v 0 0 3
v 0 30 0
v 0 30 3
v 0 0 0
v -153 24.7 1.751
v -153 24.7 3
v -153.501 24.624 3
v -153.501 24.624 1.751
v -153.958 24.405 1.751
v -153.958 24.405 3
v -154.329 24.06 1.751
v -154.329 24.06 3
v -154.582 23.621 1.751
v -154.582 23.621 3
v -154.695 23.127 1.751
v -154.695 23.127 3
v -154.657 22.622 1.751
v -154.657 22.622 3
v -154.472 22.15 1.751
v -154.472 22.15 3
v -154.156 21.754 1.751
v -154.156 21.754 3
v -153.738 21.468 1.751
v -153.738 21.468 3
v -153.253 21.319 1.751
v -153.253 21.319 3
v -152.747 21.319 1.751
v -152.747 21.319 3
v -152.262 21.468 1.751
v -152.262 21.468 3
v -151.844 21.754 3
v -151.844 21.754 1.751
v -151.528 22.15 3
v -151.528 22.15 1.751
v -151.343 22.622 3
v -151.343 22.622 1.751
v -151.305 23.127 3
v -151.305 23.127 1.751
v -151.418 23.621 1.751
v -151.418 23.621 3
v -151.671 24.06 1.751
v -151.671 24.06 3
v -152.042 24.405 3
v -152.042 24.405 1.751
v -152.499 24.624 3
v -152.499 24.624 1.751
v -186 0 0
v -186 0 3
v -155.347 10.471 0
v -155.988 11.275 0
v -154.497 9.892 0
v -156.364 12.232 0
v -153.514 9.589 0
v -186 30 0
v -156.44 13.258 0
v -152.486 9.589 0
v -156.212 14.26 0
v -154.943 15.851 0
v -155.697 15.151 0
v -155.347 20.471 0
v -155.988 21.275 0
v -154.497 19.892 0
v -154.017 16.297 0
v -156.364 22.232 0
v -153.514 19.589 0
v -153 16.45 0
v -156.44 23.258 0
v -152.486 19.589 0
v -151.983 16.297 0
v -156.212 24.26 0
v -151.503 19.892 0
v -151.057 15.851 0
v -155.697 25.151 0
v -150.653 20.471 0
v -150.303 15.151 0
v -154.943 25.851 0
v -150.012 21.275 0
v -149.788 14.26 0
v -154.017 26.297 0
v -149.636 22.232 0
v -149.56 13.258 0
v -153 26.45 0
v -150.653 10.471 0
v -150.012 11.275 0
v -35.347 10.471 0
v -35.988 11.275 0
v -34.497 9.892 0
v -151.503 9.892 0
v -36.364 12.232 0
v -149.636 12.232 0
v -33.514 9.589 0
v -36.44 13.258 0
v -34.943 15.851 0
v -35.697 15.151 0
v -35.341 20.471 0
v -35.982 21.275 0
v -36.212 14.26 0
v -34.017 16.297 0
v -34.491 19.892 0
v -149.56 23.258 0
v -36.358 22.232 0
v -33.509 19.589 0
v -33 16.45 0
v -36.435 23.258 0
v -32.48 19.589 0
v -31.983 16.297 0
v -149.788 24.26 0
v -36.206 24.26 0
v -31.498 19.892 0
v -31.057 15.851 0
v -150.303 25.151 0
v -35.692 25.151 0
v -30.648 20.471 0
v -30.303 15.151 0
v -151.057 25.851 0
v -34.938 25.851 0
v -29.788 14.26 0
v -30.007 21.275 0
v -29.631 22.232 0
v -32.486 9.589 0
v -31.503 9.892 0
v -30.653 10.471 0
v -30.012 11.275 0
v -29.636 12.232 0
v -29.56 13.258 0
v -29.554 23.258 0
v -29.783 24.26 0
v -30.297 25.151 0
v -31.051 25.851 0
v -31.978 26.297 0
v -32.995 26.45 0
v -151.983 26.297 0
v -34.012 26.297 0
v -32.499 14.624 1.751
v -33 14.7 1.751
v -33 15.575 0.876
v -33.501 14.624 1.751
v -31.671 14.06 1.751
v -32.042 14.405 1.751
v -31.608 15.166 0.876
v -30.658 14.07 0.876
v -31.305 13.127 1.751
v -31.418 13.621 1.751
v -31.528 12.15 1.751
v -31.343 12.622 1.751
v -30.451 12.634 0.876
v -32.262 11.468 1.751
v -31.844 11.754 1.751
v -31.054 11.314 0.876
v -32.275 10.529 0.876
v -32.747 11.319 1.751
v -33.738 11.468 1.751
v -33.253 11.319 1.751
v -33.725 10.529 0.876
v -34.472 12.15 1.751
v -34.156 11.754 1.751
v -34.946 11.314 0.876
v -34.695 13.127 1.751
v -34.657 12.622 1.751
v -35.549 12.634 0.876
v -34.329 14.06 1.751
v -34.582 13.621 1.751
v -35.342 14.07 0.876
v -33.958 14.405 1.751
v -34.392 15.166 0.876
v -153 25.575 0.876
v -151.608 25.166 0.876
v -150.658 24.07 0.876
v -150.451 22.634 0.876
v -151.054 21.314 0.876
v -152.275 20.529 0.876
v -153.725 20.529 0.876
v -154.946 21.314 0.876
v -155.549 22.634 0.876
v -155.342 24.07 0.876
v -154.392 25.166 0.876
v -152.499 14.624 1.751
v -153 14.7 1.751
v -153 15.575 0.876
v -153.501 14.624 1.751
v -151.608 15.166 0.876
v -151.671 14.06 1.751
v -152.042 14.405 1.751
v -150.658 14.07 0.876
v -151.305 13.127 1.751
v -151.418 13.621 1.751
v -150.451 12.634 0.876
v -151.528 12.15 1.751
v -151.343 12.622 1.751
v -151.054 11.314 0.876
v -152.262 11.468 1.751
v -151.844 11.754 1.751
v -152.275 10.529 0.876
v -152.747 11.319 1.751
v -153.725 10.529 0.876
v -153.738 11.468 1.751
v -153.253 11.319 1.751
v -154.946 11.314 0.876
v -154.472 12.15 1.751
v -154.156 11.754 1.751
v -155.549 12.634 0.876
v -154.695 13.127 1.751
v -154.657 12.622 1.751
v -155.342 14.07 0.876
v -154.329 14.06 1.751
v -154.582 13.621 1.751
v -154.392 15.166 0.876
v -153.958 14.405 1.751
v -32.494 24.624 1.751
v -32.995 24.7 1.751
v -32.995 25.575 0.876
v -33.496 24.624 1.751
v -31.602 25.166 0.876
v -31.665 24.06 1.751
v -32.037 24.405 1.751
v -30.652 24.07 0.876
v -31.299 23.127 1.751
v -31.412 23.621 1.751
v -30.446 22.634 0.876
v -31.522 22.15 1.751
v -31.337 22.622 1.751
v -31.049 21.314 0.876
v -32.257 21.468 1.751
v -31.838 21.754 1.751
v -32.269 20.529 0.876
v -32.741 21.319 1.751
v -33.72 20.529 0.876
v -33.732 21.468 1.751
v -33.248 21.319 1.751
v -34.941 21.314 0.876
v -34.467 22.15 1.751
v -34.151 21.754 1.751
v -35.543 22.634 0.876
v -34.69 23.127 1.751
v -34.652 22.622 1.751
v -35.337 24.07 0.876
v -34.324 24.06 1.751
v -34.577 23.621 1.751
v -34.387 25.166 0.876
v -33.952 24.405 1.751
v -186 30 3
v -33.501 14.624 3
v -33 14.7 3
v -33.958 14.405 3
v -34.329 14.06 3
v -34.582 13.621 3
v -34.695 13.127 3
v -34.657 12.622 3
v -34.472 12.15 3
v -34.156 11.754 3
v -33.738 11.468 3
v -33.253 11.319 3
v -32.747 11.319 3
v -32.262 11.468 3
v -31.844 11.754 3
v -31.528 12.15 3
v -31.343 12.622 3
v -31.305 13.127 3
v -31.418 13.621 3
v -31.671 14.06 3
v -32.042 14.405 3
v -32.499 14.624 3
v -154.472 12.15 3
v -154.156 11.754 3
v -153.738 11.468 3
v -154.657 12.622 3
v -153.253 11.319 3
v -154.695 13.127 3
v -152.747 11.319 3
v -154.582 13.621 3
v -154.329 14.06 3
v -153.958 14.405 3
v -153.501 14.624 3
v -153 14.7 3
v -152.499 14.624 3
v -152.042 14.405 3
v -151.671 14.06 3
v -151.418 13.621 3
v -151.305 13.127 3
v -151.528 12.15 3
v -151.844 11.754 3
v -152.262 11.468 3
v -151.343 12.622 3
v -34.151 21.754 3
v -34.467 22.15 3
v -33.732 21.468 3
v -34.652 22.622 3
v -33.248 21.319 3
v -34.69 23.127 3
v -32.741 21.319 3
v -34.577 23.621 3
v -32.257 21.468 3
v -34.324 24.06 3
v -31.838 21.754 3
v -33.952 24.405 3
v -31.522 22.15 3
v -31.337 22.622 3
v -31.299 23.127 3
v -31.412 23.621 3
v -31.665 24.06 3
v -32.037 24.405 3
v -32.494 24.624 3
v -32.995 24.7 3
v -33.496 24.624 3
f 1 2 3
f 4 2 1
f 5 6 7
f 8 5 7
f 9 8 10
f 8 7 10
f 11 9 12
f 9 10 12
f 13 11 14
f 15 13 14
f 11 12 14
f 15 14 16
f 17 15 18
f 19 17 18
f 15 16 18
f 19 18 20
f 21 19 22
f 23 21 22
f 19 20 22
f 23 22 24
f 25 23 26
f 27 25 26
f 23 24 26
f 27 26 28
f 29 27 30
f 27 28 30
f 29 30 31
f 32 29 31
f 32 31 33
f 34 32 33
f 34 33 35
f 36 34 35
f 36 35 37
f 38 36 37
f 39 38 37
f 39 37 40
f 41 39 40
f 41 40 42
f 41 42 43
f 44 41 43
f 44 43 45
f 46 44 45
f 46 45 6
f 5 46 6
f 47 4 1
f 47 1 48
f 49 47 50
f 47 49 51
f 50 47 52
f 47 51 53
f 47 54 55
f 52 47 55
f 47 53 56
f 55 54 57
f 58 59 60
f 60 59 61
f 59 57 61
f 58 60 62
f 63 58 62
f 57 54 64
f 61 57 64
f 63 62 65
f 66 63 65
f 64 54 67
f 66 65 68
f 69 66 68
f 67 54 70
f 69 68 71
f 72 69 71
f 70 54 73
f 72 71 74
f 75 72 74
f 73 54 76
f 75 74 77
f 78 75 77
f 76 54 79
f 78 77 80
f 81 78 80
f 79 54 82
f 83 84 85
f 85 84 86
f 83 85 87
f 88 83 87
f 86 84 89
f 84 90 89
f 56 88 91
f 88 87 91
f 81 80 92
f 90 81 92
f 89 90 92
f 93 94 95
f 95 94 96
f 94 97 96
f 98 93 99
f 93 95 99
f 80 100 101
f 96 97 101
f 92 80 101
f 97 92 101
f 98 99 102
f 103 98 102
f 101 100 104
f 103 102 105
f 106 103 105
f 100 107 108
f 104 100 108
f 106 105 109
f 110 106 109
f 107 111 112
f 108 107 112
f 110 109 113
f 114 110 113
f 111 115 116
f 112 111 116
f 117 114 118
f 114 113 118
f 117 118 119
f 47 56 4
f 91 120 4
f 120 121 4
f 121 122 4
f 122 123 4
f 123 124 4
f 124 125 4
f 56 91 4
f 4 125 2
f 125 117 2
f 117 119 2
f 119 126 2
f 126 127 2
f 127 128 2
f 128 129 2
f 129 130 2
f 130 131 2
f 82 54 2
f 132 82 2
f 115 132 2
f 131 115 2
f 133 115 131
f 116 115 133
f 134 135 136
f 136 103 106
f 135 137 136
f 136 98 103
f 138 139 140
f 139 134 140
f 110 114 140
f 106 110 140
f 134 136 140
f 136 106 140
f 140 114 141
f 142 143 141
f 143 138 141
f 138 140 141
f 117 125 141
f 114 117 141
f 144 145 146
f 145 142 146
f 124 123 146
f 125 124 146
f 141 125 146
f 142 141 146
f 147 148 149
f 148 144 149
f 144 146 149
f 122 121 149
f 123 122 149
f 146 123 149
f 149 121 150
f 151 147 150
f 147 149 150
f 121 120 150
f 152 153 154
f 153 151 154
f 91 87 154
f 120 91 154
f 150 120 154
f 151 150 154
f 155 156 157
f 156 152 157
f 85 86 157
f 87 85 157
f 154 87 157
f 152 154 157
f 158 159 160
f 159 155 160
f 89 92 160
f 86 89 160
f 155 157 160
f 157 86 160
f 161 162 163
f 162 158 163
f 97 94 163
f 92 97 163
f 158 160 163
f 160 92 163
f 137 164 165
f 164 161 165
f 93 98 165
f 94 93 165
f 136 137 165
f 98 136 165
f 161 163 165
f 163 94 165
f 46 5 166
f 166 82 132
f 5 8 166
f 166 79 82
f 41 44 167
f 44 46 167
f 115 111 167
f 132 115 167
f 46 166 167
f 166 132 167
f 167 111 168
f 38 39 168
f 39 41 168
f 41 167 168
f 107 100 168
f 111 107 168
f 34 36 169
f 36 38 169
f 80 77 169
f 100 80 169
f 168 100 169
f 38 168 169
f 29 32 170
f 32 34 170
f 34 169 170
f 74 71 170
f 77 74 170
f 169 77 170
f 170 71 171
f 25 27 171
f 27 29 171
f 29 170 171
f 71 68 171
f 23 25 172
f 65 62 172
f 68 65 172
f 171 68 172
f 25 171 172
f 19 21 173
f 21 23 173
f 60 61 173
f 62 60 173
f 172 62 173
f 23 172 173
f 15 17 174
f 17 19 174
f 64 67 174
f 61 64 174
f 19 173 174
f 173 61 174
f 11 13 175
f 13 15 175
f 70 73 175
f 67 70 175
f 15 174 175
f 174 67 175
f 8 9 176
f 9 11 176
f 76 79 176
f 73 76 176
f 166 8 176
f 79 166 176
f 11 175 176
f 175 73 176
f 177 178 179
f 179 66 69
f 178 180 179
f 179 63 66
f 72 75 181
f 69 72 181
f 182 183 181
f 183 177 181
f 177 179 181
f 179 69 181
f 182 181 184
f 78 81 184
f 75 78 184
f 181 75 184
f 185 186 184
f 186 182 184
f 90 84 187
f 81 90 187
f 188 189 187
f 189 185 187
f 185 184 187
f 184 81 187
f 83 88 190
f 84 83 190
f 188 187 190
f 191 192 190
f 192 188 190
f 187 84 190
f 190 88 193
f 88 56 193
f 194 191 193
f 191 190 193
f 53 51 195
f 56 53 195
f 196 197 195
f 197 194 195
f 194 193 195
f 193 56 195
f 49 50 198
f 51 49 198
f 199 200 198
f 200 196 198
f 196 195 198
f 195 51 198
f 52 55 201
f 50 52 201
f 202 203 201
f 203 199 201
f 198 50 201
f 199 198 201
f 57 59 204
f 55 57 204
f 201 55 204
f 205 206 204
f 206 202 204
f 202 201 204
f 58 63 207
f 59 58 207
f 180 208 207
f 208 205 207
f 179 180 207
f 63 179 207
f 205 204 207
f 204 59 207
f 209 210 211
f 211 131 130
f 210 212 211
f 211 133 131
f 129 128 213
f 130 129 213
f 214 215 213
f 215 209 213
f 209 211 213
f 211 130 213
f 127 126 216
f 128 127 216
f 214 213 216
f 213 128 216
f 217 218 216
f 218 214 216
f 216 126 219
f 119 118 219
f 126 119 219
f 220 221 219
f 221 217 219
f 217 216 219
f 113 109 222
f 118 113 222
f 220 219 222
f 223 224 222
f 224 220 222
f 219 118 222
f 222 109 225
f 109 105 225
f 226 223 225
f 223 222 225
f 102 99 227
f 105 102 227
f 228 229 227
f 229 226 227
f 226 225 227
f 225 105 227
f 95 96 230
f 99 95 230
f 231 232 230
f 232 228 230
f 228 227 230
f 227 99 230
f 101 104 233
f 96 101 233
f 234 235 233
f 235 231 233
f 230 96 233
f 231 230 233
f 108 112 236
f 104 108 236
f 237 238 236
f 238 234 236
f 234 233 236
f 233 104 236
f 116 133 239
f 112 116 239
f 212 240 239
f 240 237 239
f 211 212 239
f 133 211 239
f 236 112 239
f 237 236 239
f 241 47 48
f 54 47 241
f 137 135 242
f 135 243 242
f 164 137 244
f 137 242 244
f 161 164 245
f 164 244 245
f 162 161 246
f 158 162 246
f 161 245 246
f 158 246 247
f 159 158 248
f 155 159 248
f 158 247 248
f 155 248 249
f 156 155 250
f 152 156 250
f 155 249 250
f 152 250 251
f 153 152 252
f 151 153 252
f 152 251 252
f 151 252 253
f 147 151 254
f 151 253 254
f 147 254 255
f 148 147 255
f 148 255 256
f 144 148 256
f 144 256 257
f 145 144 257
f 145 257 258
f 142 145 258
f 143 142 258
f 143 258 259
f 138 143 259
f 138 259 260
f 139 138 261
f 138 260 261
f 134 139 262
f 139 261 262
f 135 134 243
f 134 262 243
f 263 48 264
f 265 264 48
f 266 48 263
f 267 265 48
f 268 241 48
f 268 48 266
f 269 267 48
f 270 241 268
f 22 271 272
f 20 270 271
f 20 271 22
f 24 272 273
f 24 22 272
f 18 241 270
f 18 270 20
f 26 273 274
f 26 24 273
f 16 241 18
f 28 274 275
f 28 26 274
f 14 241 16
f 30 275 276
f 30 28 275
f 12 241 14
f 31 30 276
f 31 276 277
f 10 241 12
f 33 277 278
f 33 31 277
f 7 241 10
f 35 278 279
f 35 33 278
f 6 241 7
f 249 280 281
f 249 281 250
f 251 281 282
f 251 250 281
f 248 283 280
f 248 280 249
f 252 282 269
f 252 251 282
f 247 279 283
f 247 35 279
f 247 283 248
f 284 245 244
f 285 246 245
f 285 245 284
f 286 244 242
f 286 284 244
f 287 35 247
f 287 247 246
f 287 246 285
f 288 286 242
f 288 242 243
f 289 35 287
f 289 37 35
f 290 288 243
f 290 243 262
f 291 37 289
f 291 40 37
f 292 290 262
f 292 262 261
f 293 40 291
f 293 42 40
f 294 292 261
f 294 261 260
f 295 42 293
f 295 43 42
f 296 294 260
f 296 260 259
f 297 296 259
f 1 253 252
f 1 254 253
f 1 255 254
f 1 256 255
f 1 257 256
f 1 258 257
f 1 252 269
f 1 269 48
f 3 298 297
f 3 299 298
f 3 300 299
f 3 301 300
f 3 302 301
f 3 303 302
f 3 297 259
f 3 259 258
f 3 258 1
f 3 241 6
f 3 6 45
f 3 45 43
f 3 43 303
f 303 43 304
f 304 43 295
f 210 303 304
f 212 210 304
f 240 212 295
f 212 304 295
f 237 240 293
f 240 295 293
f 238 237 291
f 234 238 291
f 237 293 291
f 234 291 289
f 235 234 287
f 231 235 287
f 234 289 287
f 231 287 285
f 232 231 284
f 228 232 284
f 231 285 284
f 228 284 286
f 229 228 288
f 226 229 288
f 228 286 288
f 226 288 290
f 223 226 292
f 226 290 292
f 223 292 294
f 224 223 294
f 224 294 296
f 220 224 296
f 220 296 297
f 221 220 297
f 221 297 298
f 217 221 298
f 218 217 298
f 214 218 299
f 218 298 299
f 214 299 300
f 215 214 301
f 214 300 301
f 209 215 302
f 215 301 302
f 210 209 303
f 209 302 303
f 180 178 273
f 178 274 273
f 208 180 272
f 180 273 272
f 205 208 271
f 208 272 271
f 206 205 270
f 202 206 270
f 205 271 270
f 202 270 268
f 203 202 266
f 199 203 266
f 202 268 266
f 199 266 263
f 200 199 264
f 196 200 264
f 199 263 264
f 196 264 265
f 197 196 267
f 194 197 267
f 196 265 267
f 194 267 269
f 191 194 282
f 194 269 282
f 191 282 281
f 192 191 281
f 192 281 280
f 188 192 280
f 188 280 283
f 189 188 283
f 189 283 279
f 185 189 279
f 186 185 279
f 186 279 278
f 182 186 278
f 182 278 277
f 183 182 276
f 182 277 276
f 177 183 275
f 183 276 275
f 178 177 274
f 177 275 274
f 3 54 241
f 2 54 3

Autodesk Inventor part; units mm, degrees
ref_plane "YZ Plane" through (0, 0, 0) normal (1, 0, 0) x (0, 1, 0)
ref_plane "XZ Plane" through (0, 0, 0) normal (0, 1, 0) x (-1, 0, 0)
ref_plane "XY Plane" through (0, 0, 0) normal (0, 0, 1) x (1, 0, 0)
sketch "Sketch1" plane through (0, 0, 0) normal (0, 0, 1) x (1, 0, 0)
  line L0 (0, 0) -> (-186, 0)
  line L1 (-186, 0) -> (-186, 30)
  line L2 (-186, 30) -> (0, 30)
  line L3 (0, 30) -> (0, 0)
  dimension "d0" = 186
  dimension "d1" = 30
extrude "Extrusion1" add sketch "Sketch1" along normal blind 3
sketch "Sketch2" plane through (0, 0, 0) normal (0, 0, -1) x (-1, 0, 0)
  line L0 (0, 0) -> (186, 0) projected
  line L1 (0, 0) -> (33, 0)
  line L2 (33, 0) -> (33, 13)
  line L3 (33, 13) -> (0, 13)
  line L4 (0, 13) -> (0, 0)
  line L5 (0, 30) -> (186, 30) projected
  line L6 (0, 30) -> (32.9946, 30)
  line L7 (32.9946, 30) -> (32.9946, 23)
  line L8 (32.9946, 23) -> (0, 23)
  line L9 (0, 23) -> (0, 30)
  line L10 (186, 0) -> (153, 0)
  line L11 (153, 0) -> (153, 13)
  line L12 (153, 13) -> (186, 13)
  line L13 (186, 13) -> (186, 0)
  line L14 (186, 30) -> (153, 30)
  line L15 (153, 30) -> (153, 23)
  line L16 (153, 23) -> (186, 23)
  line L17 (186, 23) -> (186, 30)
  dimension "d16" = 33
  dimension "d17" = 13
  dimension "d18" = 32.9946
  dimension "d19" = 7
  dimension "d20" = 33
hole "Hole1" at (-32.9946, 23, 0) at (-33, 13, 0) at (-153, 23, 0) at (-153, 13, 0) direction (0, 0, 1) diameter 3.4 end through all countersink diameter 6.9 countersink angle 89.954 clearance for "Countersunk Flat Head Screw ISO 2009/7046" size "M3" standard "ISO"
properties part number "tyl"
